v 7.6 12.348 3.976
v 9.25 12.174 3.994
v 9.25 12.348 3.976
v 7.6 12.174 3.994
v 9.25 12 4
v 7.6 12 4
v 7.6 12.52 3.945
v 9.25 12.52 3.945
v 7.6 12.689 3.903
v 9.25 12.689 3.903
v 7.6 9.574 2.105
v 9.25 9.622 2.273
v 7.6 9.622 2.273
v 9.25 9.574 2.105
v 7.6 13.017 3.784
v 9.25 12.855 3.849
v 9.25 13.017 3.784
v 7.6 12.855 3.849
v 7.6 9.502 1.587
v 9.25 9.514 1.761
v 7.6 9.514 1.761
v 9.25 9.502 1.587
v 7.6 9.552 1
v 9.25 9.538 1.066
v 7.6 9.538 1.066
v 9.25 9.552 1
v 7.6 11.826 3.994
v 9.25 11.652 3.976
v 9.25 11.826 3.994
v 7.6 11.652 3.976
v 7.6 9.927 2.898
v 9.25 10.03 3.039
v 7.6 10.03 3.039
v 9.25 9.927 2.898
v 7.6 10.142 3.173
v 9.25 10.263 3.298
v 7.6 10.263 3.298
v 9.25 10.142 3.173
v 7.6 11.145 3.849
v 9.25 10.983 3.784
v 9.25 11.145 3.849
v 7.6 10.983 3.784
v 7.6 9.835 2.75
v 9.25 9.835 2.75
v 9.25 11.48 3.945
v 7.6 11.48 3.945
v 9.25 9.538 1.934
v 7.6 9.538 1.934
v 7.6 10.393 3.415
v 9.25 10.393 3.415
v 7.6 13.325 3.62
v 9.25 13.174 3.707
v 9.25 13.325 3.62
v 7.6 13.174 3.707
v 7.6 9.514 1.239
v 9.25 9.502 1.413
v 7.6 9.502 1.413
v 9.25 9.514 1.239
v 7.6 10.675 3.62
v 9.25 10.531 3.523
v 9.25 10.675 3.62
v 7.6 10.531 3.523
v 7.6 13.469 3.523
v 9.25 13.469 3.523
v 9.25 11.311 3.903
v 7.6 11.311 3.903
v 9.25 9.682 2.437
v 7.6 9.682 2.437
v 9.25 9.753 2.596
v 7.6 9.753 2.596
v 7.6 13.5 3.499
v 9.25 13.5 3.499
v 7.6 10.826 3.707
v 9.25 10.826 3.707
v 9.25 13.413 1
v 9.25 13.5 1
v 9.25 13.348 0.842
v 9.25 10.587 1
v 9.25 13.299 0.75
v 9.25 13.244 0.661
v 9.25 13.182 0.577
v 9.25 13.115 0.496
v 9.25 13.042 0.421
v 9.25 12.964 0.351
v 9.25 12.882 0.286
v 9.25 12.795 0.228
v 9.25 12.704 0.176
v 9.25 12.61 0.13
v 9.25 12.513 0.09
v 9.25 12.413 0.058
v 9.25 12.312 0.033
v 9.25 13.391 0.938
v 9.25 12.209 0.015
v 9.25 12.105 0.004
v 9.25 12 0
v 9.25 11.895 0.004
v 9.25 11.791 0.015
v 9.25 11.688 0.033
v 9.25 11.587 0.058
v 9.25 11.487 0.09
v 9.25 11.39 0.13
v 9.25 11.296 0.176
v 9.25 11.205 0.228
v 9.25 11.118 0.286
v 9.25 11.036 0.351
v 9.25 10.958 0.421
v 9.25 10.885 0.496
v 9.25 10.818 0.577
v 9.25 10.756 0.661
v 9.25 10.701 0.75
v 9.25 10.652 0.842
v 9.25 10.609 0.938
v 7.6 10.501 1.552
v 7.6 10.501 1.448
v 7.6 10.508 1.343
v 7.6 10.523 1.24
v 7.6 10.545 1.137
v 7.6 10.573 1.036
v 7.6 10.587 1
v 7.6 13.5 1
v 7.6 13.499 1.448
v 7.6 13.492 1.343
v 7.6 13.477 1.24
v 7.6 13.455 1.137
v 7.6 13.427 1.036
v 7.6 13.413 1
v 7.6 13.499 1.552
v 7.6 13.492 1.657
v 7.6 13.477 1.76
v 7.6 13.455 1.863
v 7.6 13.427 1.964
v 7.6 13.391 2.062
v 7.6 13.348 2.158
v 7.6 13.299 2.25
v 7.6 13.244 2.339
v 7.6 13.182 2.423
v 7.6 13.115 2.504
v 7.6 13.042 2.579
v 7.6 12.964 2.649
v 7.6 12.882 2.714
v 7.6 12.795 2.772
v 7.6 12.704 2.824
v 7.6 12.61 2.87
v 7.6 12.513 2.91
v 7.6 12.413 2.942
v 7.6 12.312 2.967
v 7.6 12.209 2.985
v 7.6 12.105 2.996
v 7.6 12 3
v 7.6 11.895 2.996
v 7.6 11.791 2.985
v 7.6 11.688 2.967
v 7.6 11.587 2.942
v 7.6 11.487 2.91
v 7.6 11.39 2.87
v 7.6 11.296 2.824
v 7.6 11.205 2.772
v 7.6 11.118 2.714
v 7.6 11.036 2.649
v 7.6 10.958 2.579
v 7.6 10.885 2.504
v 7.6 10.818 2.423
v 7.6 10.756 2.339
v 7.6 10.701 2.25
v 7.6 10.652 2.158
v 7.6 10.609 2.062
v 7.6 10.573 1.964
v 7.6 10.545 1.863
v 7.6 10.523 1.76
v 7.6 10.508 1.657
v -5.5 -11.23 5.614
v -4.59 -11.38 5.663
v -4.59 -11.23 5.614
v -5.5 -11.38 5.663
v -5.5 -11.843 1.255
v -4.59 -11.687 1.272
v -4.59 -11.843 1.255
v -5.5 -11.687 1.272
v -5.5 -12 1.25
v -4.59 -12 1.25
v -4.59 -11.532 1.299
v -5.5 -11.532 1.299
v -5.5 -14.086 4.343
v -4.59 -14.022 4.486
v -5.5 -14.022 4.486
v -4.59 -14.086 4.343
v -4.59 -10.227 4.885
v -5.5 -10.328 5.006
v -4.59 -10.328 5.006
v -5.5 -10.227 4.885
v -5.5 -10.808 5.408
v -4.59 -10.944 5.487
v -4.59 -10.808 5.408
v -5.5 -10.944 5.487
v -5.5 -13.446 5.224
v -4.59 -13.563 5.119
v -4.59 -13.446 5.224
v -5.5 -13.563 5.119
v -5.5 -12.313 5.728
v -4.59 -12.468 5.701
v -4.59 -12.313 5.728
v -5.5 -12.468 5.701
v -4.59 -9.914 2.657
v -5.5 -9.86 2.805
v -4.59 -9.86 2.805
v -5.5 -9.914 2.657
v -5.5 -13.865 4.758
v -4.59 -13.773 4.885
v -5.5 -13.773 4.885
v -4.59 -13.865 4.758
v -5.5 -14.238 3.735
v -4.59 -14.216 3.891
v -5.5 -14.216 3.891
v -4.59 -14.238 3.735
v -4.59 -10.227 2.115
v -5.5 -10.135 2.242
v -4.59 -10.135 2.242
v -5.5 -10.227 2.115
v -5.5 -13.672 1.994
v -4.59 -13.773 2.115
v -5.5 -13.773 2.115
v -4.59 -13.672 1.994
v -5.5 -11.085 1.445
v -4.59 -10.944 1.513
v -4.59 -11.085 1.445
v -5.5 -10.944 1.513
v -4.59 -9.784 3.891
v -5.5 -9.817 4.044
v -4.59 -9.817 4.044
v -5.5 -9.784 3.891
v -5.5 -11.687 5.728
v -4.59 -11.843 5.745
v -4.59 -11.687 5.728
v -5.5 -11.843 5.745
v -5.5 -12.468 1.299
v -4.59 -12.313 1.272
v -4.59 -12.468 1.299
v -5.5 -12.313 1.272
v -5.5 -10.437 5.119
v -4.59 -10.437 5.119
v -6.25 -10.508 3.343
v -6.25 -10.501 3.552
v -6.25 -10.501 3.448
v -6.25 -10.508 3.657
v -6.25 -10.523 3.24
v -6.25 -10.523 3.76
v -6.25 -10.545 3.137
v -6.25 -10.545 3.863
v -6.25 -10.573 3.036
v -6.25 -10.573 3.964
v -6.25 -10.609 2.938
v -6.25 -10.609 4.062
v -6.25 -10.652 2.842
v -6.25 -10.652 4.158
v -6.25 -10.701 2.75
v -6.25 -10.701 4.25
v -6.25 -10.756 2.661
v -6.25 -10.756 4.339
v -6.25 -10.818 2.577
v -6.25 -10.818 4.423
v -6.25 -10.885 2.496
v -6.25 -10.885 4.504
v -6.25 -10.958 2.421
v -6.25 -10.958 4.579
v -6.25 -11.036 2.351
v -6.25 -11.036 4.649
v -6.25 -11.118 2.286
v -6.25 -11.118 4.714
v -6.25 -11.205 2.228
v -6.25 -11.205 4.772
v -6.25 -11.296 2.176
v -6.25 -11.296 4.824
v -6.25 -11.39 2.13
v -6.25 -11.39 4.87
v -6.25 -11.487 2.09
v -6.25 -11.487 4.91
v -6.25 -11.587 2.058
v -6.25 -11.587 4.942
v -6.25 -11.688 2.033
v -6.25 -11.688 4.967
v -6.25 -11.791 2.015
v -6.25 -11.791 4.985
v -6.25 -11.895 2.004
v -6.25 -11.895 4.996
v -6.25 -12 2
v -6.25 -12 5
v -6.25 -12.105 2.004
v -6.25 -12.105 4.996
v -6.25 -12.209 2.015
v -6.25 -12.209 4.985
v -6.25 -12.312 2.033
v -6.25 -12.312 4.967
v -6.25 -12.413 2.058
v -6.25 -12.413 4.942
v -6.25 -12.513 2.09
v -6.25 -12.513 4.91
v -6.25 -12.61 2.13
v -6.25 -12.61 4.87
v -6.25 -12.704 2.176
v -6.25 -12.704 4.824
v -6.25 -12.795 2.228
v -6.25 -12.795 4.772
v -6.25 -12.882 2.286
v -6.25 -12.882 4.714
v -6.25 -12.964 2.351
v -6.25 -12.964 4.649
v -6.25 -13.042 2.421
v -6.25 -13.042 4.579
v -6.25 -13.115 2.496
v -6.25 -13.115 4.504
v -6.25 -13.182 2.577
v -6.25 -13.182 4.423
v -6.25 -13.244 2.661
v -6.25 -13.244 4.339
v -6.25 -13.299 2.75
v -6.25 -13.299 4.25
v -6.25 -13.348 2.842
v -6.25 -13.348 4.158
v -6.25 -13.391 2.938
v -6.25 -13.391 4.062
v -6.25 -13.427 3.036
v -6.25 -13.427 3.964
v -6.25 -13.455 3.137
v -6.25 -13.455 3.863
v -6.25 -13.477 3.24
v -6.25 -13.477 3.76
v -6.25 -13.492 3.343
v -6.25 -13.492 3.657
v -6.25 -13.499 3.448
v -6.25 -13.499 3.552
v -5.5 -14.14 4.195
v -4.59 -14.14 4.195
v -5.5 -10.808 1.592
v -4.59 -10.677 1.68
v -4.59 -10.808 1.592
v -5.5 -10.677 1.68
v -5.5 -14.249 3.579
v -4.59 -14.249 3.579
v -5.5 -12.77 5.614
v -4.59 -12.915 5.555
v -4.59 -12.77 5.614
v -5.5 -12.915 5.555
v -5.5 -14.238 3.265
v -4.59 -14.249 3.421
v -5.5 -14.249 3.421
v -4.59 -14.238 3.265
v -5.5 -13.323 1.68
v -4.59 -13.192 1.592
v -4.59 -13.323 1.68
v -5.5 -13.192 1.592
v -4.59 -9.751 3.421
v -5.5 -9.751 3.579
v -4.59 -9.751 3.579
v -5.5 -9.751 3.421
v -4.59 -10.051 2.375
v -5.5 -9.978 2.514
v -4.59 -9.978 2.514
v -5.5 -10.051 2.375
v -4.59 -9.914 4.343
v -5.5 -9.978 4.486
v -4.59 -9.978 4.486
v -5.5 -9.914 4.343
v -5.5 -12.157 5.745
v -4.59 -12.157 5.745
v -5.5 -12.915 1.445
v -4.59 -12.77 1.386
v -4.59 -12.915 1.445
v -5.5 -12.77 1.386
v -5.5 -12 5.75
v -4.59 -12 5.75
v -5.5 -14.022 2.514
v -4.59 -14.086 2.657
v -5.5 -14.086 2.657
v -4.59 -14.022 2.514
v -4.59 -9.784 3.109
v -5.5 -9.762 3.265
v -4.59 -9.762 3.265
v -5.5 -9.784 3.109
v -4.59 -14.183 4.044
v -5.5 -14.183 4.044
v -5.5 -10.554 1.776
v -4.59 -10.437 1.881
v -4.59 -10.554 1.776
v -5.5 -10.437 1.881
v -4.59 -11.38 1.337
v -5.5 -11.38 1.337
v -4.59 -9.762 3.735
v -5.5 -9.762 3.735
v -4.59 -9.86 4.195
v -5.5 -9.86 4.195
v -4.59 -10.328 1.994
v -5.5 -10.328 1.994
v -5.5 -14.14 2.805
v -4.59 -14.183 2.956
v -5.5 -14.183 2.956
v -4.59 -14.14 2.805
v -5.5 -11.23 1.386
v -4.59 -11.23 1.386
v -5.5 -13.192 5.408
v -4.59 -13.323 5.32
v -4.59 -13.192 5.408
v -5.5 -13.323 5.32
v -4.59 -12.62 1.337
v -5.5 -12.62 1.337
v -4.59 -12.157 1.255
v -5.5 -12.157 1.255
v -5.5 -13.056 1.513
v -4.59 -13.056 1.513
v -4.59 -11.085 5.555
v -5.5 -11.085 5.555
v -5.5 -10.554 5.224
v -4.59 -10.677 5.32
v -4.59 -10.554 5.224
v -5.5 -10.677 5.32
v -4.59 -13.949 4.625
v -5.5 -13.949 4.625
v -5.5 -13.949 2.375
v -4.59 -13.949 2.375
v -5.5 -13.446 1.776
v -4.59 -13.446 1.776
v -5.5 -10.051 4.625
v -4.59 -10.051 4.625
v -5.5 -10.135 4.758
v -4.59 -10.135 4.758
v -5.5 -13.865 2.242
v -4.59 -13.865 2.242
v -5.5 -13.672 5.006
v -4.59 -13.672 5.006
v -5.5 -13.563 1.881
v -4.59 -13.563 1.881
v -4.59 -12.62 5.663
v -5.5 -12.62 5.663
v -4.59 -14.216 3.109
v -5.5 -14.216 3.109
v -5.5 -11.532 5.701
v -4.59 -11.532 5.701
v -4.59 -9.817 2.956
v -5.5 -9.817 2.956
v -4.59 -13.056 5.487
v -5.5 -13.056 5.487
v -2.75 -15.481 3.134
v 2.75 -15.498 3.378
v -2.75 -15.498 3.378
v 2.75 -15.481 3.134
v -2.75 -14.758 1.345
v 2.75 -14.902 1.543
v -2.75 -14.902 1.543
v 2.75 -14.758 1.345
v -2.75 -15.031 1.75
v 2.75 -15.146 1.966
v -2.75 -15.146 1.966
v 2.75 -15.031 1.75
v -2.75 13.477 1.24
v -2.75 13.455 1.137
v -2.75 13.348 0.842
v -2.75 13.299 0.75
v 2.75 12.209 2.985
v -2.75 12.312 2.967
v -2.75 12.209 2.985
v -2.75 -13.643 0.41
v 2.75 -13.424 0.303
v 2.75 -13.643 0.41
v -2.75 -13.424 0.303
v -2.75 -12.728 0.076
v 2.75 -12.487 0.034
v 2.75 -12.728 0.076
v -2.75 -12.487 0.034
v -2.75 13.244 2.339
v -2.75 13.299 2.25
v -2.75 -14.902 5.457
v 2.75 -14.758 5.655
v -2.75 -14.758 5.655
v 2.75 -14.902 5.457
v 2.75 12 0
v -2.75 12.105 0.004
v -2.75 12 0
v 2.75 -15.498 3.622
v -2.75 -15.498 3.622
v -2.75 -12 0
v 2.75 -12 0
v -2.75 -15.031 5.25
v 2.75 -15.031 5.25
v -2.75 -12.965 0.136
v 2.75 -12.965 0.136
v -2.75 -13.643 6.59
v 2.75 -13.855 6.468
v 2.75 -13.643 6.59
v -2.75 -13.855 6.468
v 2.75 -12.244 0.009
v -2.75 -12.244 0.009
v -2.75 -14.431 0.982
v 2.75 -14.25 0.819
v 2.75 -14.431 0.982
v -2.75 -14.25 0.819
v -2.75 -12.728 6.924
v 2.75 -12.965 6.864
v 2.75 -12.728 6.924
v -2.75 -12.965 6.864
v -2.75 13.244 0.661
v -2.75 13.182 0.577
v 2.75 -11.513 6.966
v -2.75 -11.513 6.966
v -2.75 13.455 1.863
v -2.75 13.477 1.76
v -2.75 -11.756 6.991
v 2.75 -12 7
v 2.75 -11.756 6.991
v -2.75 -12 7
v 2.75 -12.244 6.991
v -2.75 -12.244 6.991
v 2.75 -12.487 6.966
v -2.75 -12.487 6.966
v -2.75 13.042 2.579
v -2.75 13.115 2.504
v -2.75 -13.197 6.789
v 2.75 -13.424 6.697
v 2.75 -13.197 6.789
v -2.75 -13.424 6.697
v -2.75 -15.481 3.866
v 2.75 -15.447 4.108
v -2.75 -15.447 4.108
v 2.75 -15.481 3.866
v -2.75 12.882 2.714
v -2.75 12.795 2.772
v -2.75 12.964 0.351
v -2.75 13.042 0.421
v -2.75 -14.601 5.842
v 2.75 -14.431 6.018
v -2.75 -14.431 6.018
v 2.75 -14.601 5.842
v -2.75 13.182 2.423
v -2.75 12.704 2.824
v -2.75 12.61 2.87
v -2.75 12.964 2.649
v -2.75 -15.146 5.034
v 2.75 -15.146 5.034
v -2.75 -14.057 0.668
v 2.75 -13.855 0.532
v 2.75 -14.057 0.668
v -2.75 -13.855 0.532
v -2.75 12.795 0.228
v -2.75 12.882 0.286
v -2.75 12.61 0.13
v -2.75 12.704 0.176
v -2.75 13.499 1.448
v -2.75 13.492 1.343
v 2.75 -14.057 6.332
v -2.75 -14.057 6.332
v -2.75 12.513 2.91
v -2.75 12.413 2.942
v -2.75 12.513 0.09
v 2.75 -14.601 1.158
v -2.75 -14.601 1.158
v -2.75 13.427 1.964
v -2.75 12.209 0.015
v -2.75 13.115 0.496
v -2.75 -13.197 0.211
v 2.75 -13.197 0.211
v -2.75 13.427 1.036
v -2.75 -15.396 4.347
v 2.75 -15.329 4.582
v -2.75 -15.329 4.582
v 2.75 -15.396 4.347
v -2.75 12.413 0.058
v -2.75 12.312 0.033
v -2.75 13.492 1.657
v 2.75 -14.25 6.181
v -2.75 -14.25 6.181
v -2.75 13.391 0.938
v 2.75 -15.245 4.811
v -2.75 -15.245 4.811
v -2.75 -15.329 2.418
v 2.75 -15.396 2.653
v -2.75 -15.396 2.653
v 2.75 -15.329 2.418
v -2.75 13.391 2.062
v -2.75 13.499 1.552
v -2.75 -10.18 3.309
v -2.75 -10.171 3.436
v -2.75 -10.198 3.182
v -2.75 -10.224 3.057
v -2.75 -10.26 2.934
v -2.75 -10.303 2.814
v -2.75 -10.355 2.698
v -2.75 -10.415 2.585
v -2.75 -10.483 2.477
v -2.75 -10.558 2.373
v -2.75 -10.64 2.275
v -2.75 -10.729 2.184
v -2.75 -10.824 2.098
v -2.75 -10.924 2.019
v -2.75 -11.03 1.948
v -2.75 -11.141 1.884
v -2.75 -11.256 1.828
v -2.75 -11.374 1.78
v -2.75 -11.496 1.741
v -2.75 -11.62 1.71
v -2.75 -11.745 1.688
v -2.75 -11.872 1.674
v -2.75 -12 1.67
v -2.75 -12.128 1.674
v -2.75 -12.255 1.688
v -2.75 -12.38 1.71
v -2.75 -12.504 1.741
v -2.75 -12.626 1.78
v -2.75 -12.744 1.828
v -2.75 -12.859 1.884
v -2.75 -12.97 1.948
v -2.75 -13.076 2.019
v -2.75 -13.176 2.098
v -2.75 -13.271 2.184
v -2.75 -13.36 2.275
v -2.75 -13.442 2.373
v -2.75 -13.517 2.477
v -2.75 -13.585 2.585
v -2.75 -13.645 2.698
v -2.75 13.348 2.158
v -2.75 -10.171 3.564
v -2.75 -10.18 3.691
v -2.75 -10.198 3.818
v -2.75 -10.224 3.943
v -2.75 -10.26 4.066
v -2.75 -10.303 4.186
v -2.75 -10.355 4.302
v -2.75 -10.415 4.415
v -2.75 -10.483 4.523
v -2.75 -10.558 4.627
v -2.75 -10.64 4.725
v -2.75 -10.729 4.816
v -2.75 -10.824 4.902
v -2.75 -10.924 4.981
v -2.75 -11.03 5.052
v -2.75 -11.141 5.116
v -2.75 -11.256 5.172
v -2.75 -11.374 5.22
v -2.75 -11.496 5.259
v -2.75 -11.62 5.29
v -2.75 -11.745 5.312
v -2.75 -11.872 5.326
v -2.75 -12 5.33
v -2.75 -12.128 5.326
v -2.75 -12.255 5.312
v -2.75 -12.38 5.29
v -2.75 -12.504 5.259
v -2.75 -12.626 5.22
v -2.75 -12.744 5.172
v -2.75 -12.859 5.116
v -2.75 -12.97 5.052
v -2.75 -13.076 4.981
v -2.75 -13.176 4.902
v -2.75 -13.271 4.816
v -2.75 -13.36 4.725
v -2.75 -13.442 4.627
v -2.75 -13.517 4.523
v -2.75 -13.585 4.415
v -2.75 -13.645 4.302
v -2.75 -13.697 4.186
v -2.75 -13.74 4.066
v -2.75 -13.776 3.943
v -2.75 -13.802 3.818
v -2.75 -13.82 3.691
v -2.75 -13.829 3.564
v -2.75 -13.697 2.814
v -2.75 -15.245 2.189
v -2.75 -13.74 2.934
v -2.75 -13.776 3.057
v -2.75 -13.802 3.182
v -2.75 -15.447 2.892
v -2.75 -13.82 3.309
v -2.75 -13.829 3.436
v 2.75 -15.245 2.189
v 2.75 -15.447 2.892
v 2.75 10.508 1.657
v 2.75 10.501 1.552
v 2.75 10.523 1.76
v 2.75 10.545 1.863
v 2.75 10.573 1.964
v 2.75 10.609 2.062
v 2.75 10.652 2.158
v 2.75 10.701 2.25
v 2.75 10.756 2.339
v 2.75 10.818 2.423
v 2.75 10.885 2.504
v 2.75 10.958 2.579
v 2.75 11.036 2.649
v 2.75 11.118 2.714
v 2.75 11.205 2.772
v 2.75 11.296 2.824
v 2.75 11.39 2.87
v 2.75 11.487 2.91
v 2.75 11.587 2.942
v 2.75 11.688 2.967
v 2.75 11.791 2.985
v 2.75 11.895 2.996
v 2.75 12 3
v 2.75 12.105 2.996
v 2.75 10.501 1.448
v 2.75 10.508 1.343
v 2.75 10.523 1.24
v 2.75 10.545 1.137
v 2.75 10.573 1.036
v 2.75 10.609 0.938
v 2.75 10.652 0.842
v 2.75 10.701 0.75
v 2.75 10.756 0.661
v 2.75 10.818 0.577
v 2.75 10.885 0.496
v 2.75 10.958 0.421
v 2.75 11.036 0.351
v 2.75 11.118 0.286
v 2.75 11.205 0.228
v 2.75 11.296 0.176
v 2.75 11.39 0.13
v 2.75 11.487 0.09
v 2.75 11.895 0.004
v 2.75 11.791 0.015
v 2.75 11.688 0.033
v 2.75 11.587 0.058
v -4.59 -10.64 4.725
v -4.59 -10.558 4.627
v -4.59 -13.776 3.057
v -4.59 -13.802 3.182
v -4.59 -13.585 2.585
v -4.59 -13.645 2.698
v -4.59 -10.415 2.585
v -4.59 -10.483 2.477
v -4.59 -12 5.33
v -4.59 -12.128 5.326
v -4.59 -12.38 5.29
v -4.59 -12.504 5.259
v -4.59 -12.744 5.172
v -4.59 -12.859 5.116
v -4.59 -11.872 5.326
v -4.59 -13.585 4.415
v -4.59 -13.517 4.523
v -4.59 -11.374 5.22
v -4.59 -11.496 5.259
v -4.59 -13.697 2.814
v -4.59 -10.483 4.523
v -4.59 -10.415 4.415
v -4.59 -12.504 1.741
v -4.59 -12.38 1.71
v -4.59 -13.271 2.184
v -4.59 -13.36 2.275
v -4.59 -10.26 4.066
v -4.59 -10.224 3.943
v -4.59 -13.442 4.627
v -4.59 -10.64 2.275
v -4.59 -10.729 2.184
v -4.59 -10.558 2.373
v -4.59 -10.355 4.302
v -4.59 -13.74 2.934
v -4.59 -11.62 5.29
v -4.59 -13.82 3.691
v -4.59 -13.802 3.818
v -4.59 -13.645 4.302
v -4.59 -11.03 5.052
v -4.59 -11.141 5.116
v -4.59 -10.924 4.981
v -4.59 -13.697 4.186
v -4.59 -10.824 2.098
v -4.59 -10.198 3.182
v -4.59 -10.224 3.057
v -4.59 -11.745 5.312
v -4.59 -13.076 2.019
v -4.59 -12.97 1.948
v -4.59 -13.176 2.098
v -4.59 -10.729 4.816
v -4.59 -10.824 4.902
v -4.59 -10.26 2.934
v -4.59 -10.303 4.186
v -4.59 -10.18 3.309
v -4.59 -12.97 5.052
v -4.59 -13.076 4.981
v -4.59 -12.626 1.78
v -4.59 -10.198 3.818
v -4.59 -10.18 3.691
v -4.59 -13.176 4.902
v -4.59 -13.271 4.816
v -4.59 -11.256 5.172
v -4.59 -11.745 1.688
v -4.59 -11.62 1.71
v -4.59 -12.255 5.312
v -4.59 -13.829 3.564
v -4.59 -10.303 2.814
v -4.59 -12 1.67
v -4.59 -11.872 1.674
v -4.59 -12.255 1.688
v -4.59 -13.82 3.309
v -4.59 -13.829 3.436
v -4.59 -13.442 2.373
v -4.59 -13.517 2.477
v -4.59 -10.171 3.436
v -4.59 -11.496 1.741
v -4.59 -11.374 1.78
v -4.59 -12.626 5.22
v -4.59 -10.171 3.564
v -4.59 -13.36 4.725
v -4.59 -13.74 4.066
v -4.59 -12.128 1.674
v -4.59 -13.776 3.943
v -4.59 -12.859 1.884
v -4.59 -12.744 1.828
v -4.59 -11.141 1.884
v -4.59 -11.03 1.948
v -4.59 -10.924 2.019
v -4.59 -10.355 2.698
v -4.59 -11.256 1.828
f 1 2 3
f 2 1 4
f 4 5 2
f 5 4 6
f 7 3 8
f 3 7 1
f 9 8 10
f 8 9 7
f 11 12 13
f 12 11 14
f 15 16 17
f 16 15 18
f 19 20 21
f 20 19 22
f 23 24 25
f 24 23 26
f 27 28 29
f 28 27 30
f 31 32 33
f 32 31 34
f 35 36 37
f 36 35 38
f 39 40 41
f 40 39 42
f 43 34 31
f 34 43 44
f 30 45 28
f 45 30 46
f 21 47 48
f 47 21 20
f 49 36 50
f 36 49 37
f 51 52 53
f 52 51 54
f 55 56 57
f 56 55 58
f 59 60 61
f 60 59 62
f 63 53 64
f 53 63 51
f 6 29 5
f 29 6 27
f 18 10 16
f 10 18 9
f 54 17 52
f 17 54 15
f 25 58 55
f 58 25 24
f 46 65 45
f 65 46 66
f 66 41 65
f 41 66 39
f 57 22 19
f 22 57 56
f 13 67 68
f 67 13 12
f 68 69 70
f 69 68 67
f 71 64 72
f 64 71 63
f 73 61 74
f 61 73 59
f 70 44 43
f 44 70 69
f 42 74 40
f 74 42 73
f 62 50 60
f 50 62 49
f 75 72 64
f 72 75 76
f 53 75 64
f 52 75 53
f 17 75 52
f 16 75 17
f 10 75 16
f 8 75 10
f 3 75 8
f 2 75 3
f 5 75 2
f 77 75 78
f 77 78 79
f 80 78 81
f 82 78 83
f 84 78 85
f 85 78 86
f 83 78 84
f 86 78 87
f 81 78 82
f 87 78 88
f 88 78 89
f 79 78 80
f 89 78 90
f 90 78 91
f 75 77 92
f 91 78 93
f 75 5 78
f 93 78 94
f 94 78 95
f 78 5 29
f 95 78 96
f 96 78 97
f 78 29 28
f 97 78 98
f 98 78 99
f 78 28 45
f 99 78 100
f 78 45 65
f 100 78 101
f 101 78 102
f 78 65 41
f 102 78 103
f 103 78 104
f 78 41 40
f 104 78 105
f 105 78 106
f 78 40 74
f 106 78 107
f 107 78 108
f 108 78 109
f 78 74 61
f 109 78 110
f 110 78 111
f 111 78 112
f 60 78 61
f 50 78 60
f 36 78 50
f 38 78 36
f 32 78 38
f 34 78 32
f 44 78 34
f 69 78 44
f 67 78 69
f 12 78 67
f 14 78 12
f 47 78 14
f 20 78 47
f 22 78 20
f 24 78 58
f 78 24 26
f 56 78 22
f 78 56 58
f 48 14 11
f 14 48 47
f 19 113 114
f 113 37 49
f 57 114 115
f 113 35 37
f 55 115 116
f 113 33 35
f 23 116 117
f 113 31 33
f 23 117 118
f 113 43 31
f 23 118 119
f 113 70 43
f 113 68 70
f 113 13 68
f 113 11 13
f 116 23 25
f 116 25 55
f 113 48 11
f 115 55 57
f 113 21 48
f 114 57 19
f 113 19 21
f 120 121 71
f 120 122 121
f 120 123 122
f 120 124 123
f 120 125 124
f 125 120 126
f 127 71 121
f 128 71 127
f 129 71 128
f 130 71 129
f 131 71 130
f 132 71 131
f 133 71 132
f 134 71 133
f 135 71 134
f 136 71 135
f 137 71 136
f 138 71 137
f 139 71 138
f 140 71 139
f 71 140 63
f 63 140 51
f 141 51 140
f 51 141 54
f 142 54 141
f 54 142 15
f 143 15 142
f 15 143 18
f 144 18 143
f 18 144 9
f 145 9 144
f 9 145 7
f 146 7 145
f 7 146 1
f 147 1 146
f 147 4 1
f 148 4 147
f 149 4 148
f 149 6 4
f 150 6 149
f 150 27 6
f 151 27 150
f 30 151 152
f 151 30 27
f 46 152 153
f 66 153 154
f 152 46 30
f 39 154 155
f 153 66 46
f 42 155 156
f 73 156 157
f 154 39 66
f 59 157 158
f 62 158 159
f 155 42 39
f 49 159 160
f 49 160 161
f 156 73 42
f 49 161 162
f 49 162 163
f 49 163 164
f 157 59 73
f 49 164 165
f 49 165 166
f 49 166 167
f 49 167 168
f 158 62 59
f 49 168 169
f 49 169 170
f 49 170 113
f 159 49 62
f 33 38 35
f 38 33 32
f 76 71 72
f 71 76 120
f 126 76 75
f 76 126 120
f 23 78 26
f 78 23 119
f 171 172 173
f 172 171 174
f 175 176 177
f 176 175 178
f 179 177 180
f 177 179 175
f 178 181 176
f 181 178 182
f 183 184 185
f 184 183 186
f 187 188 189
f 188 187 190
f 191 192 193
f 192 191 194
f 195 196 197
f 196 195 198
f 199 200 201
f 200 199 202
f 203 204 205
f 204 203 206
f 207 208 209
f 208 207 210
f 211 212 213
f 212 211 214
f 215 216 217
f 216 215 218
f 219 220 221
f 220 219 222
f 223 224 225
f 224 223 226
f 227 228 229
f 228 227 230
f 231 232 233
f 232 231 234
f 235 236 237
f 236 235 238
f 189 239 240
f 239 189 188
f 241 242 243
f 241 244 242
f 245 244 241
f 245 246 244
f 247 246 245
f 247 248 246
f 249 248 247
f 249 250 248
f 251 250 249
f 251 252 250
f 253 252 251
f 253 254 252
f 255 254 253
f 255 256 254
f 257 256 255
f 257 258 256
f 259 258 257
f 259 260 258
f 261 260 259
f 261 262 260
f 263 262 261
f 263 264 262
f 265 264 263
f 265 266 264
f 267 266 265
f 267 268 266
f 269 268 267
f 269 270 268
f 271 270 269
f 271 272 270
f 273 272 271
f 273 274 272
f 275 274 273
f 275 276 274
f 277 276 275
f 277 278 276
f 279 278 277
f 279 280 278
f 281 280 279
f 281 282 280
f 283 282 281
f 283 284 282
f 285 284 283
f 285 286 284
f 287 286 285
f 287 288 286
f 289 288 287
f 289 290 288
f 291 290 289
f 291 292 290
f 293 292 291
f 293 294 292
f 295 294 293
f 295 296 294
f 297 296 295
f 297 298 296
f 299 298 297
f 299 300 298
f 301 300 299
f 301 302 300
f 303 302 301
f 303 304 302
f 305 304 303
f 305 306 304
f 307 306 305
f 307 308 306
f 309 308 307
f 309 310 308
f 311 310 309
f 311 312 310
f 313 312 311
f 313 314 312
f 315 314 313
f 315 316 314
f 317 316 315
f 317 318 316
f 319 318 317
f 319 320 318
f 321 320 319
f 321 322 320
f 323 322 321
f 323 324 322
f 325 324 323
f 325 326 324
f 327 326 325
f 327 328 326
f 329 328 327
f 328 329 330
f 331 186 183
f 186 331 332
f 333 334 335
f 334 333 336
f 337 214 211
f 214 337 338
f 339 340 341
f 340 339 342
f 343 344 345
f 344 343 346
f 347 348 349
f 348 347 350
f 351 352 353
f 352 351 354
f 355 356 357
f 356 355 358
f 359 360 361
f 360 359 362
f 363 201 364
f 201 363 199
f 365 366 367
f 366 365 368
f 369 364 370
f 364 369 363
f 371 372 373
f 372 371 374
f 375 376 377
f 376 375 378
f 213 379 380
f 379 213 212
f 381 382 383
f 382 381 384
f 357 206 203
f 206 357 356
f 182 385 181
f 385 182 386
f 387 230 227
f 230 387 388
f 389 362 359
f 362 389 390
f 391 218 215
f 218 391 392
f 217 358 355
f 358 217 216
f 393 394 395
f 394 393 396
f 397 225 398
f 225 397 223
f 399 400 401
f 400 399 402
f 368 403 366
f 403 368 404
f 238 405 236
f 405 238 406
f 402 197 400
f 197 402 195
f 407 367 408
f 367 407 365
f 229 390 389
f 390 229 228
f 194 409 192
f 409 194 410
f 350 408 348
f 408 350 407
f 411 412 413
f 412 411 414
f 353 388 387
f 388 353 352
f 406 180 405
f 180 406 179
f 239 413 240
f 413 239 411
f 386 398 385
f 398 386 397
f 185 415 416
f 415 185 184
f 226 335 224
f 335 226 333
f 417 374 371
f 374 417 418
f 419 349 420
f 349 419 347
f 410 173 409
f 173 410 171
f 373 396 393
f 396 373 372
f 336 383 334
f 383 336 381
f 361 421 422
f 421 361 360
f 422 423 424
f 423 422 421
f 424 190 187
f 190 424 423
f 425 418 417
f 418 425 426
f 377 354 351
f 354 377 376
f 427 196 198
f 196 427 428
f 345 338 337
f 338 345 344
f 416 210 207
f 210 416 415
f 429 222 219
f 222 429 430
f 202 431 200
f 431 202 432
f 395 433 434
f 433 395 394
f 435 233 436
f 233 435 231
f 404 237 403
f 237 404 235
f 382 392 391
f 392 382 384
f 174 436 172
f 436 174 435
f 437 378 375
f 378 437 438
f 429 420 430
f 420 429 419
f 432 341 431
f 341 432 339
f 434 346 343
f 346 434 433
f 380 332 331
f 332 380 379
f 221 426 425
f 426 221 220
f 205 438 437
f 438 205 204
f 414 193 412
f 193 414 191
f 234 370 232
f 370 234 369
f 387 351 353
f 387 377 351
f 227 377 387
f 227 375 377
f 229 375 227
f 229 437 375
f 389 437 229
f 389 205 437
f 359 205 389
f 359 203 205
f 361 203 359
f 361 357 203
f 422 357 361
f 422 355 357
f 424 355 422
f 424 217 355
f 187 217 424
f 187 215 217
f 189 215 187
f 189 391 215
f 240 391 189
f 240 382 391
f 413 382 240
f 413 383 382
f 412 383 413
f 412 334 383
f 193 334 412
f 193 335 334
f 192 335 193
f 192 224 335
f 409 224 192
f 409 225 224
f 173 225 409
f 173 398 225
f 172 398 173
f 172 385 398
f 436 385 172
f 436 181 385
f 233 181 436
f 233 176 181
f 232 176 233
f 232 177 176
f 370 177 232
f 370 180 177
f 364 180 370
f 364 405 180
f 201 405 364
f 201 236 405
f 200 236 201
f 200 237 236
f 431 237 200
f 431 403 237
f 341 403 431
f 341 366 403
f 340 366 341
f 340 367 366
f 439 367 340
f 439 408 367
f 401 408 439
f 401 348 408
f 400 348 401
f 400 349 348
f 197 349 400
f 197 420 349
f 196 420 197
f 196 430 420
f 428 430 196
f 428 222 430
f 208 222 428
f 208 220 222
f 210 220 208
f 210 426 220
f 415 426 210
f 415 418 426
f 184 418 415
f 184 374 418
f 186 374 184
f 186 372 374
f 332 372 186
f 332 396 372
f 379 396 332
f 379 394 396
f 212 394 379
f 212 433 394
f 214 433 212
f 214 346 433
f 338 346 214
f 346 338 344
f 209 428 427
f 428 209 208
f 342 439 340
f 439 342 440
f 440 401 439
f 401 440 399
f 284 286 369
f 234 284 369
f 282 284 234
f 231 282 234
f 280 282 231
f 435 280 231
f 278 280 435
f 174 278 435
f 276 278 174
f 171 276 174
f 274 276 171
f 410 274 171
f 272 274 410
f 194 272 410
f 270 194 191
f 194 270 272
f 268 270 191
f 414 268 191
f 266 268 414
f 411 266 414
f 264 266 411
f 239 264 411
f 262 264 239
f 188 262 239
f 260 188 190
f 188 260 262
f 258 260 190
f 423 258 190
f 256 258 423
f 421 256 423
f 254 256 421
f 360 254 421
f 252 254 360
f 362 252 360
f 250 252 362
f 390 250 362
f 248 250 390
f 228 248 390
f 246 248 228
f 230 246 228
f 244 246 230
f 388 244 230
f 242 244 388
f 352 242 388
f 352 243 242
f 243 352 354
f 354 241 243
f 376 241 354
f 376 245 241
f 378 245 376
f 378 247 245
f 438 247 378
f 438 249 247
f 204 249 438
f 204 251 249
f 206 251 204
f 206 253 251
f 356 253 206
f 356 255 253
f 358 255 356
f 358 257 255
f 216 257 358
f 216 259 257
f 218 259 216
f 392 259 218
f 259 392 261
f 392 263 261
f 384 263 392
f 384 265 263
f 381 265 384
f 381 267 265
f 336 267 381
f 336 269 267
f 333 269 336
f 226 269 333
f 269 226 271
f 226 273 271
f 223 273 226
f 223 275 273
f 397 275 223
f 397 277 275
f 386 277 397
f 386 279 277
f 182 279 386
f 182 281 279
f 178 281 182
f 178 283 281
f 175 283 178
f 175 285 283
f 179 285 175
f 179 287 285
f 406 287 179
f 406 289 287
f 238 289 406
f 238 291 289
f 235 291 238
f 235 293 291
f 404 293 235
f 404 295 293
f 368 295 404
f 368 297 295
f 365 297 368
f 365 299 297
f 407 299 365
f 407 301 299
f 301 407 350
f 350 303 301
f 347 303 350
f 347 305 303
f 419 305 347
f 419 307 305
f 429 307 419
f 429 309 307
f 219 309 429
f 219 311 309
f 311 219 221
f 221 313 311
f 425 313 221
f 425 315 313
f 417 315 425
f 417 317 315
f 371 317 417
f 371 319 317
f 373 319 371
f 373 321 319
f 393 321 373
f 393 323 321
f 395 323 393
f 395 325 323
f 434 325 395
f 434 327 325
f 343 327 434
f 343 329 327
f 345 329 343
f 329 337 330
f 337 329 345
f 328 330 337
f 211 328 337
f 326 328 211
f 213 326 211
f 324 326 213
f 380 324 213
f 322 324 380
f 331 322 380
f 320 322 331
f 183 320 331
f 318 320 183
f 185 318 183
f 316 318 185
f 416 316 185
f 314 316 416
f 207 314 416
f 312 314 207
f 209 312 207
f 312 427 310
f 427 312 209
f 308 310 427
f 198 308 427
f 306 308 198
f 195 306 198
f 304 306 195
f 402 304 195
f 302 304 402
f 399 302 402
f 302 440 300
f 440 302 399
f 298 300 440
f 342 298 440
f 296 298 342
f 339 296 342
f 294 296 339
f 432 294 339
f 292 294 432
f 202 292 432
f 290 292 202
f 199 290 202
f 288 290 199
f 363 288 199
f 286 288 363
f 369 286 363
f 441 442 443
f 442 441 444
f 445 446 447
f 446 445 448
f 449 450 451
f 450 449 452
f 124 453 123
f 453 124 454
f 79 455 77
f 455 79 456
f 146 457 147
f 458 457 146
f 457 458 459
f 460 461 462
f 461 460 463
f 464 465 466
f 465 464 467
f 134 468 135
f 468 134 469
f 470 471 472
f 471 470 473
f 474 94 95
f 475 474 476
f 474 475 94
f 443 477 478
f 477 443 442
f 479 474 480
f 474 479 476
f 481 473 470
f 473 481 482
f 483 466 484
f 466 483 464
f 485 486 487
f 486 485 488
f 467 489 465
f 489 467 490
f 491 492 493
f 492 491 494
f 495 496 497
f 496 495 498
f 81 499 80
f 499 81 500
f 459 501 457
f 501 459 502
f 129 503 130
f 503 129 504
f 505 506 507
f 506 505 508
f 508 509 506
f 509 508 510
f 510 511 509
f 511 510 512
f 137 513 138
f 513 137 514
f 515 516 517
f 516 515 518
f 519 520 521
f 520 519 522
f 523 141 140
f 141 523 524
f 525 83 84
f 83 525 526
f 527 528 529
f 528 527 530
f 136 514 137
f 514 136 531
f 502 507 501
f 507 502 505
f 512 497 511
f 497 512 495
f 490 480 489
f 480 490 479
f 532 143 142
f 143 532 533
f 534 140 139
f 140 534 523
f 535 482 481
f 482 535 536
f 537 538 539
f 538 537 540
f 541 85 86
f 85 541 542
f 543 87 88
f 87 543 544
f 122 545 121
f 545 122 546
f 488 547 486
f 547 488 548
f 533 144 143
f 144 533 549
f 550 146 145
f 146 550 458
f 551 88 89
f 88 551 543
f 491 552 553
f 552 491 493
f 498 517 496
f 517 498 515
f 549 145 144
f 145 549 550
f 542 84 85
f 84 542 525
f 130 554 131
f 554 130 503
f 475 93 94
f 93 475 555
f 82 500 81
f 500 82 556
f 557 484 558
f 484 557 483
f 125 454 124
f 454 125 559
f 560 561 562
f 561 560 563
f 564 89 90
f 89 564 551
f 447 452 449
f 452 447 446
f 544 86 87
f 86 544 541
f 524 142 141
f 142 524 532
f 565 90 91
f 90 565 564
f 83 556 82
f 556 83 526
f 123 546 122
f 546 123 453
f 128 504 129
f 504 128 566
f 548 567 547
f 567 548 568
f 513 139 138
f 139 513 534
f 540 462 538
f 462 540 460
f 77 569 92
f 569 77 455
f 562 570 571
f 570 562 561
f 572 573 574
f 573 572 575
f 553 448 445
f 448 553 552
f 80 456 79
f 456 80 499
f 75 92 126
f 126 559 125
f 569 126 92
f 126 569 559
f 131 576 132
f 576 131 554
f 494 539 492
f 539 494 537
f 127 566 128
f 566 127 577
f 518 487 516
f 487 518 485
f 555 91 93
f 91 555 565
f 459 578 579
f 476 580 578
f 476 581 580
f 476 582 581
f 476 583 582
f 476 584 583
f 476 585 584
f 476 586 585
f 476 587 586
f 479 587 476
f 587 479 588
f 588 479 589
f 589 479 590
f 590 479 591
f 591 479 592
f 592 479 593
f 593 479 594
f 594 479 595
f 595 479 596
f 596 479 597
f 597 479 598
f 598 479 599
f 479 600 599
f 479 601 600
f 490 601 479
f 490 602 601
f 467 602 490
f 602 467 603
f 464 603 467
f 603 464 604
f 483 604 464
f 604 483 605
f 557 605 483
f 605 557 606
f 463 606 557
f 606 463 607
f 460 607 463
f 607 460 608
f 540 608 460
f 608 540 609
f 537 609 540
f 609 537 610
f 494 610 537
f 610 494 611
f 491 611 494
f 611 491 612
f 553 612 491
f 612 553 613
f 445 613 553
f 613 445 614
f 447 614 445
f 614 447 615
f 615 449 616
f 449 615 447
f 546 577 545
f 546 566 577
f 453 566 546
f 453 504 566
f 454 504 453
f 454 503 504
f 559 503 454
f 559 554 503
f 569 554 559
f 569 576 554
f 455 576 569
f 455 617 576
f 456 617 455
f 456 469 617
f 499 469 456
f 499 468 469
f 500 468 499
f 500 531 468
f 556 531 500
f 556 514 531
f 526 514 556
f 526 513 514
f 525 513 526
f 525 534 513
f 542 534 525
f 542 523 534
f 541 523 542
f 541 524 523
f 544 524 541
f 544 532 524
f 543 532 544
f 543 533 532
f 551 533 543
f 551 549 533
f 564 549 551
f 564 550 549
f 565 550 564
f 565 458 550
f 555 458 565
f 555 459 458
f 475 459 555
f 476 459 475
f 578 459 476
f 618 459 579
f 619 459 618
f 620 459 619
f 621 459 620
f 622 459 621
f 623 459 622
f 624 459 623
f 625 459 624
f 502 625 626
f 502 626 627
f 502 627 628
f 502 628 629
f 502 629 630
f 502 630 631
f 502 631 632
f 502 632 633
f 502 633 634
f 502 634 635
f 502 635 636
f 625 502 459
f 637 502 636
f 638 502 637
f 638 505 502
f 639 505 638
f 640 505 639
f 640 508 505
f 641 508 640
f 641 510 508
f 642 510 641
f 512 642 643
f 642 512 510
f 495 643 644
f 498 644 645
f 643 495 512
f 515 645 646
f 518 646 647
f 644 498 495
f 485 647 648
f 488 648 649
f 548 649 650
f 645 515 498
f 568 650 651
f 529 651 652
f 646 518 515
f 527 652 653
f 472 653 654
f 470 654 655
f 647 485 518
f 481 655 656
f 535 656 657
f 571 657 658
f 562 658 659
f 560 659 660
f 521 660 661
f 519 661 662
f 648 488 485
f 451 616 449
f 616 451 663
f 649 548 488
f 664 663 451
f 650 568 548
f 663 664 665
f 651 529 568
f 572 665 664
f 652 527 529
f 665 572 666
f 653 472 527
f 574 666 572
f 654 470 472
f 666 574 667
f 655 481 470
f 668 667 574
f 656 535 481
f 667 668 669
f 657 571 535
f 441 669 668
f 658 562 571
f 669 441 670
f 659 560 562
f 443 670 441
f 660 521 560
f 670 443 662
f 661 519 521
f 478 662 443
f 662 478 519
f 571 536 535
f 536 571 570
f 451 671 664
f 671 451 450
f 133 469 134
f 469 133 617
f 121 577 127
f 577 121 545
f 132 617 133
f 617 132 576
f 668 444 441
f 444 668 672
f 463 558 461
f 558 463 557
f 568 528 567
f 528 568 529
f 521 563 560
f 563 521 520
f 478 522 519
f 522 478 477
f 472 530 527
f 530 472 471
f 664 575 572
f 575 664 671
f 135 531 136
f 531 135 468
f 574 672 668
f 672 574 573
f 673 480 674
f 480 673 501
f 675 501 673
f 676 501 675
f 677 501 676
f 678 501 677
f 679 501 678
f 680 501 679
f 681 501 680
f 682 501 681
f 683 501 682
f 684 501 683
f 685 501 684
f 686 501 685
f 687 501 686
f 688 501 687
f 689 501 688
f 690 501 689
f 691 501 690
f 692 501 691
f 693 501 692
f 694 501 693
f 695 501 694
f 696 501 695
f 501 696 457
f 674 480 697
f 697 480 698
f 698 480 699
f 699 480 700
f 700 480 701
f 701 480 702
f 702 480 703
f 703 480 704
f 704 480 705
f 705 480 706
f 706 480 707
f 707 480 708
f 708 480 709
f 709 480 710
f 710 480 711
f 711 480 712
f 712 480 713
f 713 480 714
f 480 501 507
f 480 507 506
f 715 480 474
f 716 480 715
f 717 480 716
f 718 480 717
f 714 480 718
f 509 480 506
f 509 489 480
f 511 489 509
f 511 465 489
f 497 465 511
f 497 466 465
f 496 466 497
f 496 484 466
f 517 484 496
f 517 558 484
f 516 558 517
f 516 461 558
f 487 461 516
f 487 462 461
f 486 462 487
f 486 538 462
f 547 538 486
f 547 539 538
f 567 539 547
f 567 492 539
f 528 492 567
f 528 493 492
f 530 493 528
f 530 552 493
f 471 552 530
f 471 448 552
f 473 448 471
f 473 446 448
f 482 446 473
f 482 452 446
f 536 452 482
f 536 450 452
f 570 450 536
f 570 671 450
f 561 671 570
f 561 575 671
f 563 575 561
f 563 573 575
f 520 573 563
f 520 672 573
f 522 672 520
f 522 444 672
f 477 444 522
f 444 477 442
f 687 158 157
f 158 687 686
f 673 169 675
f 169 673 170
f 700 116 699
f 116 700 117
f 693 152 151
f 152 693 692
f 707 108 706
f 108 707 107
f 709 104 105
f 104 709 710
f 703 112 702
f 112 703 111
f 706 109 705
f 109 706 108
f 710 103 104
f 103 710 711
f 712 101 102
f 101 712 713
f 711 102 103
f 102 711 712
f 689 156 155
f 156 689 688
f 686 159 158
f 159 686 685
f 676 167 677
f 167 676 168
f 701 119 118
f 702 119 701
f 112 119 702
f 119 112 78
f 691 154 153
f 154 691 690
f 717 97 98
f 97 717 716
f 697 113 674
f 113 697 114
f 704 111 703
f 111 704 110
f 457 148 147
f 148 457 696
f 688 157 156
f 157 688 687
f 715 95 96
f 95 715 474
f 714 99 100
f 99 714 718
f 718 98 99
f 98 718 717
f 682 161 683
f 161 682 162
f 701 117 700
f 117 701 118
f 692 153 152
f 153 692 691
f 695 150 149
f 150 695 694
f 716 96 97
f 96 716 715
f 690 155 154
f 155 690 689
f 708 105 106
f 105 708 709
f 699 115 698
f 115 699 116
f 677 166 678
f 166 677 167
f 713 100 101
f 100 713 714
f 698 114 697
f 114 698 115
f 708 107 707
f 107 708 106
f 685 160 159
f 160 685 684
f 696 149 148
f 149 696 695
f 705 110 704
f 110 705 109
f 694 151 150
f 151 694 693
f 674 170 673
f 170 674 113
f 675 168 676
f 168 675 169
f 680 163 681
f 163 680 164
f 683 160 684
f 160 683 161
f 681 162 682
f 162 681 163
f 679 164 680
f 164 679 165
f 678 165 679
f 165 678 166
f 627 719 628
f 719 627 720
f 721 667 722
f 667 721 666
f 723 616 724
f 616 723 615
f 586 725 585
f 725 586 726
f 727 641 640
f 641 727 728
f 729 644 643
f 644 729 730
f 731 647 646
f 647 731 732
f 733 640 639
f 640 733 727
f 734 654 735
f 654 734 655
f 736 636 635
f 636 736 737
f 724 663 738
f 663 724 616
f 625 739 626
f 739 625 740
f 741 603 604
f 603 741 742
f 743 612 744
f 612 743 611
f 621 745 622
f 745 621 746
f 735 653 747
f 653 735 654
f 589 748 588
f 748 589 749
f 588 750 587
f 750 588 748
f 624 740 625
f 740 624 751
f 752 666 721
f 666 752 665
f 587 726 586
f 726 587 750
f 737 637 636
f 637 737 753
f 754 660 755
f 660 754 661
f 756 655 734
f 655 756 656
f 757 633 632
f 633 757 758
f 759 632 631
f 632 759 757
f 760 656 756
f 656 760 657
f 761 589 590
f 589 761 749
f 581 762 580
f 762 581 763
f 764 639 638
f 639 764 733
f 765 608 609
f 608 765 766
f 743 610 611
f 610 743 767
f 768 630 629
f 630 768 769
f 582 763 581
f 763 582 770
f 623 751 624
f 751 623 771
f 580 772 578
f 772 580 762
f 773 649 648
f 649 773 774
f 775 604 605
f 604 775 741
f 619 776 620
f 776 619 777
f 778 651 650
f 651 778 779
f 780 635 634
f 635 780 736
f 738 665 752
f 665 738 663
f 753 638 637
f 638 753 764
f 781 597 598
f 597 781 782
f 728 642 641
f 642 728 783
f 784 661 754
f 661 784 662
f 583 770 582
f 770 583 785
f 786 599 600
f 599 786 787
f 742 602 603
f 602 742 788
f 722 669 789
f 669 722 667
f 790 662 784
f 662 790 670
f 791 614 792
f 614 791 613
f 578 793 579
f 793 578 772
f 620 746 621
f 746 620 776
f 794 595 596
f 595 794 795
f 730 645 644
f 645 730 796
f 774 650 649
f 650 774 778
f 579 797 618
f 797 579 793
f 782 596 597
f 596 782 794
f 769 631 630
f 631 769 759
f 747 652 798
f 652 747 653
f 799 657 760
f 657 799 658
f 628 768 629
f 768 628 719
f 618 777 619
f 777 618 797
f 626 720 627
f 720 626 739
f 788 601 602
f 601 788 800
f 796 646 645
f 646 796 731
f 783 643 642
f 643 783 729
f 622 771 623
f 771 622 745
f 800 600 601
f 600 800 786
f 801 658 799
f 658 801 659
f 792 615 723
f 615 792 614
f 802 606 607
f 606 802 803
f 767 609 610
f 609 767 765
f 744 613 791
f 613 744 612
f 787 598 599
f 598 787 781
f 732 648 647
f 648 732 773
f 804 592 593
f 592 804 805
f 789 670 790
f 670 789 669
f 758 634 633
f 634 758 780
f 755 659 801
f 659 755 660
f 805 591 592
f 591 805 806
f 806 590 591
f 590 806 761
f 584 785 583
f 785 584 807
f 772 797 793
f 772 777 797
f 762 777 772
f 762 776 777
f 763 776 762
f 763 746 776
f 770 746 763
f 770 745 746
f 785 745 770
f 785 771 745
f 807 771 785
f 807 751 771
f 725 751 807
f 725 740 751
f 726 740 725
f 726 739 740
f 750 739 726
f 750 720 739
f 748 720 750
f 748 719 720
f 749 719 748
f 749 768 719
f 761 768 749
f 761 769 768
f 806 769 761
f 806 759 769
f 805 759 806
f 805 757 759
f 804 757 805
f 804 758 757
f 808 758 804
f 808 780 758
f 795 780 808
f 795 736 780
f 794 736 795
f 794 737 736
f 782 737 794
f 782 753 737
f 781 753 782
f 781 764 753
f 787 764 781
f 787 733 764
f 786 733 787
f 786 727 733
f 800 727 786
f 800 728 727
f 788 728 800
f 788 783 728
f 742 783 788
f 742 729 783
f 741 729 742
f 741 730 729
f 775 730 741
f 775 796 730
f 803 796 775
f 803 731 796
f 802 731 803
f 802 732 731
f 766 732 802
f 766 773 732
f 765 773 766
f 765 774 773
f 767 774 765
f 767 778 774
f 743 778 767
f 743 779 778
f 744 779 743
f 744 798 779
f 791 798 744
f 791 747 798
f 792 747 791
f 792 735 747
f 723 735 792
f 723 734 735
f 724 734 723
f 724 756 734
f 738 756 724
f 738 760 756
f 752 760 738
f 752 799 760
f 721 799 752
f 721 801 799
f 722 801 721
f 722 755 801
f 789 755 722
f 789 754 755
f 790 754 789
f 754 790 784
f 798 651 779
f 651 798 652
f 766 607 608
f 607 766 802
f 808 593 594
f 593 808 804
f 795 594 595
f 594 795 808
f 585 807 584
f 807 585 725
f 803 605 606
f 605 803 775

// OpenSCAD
arm_end_diameter = 3;
lid_end_diameter = 7;
ends_distance = 24;
body_width = 5.5;

lid_axle_length = 3.5;
lid_axle_diameter = 3.66; // between this (Y axis) and 3.75 (Z axis); I'm picking the narrower measurement
lid_cap_diameter = 4.5;
lid_cap_length = 1.66;
lid_cap_bevel_depth = 0.75;
lid_cap_bevel_radius = 0.75;

arm_axle_length = 6.5;
arm_cap_length = 1.65;
arm_cap_diameter = 5;

$fn = 90;

union () {
  
  // body
  hull() {
    translate ([-body_width/2,ends_distance/2,arm_end_diameter/2])
      rotate([0,90,0]) cylinder(d=arm_end_diameter,h=body_width);
    translate ([-body_width/2,-ends_distance/2,lid_end_diameter/2])
      rotate([0,90,0]) cylinder(d=lid_end_diameter,h=body_width);
  }
  
  // arm axle
  translate([body_width/2,ends_distance/2,arm_end_diameter/2])
    rotate([0,90,0]) cylinder(d=arm_end_diameter,h=arm_axle_length);
  // arm axle cap
  translate([body_width/2+arm_axle_length,ends_distance/2,arm_end_diameter/2])
    rotate([0,-90,0]) difference() {
      cylinder(d=arm_cap_diameter,h=arm_cap_length);
      translate([-arm_cap_diameter/2,arm_end_diameter/2,0])
        cube([arm_cap_diameter,arm_cap_diameter-arm_end_diameter,arm_cap_length]);
      translate([-arm_cap_diameter/2,-arm_cap_diameter/2,0])
        cube([arm_cap_diameter*2/5,arm_cap_diameter,arm_cap_length]);
  }
  
  // lid axle
  translate([-body_width/2,-ends_distance/2,lid_end_diameter/2])
    rotate([0,-90,0]) cylinder(d=lid_axle_diameter,h=lid_axle_length-lid_cap_length);
  // lid axle cap
  translate([-body_width/2-lid_axle_length,-ends_distance/2,lid_end_diameter/2])
    rotate([0,90,0]) difference() {
      cylinder(d=lid_cap_diameter,h=lid_cap_length);
      rotate_extrude() polygon(
        [[lid_cap_diameter/2-lid_cap_bevel_radius,0],
        [lid_cap_diameter/2,lid_cap_bevel_depth],
        [lid_cap_diameter/2,0]]);
    }
}
